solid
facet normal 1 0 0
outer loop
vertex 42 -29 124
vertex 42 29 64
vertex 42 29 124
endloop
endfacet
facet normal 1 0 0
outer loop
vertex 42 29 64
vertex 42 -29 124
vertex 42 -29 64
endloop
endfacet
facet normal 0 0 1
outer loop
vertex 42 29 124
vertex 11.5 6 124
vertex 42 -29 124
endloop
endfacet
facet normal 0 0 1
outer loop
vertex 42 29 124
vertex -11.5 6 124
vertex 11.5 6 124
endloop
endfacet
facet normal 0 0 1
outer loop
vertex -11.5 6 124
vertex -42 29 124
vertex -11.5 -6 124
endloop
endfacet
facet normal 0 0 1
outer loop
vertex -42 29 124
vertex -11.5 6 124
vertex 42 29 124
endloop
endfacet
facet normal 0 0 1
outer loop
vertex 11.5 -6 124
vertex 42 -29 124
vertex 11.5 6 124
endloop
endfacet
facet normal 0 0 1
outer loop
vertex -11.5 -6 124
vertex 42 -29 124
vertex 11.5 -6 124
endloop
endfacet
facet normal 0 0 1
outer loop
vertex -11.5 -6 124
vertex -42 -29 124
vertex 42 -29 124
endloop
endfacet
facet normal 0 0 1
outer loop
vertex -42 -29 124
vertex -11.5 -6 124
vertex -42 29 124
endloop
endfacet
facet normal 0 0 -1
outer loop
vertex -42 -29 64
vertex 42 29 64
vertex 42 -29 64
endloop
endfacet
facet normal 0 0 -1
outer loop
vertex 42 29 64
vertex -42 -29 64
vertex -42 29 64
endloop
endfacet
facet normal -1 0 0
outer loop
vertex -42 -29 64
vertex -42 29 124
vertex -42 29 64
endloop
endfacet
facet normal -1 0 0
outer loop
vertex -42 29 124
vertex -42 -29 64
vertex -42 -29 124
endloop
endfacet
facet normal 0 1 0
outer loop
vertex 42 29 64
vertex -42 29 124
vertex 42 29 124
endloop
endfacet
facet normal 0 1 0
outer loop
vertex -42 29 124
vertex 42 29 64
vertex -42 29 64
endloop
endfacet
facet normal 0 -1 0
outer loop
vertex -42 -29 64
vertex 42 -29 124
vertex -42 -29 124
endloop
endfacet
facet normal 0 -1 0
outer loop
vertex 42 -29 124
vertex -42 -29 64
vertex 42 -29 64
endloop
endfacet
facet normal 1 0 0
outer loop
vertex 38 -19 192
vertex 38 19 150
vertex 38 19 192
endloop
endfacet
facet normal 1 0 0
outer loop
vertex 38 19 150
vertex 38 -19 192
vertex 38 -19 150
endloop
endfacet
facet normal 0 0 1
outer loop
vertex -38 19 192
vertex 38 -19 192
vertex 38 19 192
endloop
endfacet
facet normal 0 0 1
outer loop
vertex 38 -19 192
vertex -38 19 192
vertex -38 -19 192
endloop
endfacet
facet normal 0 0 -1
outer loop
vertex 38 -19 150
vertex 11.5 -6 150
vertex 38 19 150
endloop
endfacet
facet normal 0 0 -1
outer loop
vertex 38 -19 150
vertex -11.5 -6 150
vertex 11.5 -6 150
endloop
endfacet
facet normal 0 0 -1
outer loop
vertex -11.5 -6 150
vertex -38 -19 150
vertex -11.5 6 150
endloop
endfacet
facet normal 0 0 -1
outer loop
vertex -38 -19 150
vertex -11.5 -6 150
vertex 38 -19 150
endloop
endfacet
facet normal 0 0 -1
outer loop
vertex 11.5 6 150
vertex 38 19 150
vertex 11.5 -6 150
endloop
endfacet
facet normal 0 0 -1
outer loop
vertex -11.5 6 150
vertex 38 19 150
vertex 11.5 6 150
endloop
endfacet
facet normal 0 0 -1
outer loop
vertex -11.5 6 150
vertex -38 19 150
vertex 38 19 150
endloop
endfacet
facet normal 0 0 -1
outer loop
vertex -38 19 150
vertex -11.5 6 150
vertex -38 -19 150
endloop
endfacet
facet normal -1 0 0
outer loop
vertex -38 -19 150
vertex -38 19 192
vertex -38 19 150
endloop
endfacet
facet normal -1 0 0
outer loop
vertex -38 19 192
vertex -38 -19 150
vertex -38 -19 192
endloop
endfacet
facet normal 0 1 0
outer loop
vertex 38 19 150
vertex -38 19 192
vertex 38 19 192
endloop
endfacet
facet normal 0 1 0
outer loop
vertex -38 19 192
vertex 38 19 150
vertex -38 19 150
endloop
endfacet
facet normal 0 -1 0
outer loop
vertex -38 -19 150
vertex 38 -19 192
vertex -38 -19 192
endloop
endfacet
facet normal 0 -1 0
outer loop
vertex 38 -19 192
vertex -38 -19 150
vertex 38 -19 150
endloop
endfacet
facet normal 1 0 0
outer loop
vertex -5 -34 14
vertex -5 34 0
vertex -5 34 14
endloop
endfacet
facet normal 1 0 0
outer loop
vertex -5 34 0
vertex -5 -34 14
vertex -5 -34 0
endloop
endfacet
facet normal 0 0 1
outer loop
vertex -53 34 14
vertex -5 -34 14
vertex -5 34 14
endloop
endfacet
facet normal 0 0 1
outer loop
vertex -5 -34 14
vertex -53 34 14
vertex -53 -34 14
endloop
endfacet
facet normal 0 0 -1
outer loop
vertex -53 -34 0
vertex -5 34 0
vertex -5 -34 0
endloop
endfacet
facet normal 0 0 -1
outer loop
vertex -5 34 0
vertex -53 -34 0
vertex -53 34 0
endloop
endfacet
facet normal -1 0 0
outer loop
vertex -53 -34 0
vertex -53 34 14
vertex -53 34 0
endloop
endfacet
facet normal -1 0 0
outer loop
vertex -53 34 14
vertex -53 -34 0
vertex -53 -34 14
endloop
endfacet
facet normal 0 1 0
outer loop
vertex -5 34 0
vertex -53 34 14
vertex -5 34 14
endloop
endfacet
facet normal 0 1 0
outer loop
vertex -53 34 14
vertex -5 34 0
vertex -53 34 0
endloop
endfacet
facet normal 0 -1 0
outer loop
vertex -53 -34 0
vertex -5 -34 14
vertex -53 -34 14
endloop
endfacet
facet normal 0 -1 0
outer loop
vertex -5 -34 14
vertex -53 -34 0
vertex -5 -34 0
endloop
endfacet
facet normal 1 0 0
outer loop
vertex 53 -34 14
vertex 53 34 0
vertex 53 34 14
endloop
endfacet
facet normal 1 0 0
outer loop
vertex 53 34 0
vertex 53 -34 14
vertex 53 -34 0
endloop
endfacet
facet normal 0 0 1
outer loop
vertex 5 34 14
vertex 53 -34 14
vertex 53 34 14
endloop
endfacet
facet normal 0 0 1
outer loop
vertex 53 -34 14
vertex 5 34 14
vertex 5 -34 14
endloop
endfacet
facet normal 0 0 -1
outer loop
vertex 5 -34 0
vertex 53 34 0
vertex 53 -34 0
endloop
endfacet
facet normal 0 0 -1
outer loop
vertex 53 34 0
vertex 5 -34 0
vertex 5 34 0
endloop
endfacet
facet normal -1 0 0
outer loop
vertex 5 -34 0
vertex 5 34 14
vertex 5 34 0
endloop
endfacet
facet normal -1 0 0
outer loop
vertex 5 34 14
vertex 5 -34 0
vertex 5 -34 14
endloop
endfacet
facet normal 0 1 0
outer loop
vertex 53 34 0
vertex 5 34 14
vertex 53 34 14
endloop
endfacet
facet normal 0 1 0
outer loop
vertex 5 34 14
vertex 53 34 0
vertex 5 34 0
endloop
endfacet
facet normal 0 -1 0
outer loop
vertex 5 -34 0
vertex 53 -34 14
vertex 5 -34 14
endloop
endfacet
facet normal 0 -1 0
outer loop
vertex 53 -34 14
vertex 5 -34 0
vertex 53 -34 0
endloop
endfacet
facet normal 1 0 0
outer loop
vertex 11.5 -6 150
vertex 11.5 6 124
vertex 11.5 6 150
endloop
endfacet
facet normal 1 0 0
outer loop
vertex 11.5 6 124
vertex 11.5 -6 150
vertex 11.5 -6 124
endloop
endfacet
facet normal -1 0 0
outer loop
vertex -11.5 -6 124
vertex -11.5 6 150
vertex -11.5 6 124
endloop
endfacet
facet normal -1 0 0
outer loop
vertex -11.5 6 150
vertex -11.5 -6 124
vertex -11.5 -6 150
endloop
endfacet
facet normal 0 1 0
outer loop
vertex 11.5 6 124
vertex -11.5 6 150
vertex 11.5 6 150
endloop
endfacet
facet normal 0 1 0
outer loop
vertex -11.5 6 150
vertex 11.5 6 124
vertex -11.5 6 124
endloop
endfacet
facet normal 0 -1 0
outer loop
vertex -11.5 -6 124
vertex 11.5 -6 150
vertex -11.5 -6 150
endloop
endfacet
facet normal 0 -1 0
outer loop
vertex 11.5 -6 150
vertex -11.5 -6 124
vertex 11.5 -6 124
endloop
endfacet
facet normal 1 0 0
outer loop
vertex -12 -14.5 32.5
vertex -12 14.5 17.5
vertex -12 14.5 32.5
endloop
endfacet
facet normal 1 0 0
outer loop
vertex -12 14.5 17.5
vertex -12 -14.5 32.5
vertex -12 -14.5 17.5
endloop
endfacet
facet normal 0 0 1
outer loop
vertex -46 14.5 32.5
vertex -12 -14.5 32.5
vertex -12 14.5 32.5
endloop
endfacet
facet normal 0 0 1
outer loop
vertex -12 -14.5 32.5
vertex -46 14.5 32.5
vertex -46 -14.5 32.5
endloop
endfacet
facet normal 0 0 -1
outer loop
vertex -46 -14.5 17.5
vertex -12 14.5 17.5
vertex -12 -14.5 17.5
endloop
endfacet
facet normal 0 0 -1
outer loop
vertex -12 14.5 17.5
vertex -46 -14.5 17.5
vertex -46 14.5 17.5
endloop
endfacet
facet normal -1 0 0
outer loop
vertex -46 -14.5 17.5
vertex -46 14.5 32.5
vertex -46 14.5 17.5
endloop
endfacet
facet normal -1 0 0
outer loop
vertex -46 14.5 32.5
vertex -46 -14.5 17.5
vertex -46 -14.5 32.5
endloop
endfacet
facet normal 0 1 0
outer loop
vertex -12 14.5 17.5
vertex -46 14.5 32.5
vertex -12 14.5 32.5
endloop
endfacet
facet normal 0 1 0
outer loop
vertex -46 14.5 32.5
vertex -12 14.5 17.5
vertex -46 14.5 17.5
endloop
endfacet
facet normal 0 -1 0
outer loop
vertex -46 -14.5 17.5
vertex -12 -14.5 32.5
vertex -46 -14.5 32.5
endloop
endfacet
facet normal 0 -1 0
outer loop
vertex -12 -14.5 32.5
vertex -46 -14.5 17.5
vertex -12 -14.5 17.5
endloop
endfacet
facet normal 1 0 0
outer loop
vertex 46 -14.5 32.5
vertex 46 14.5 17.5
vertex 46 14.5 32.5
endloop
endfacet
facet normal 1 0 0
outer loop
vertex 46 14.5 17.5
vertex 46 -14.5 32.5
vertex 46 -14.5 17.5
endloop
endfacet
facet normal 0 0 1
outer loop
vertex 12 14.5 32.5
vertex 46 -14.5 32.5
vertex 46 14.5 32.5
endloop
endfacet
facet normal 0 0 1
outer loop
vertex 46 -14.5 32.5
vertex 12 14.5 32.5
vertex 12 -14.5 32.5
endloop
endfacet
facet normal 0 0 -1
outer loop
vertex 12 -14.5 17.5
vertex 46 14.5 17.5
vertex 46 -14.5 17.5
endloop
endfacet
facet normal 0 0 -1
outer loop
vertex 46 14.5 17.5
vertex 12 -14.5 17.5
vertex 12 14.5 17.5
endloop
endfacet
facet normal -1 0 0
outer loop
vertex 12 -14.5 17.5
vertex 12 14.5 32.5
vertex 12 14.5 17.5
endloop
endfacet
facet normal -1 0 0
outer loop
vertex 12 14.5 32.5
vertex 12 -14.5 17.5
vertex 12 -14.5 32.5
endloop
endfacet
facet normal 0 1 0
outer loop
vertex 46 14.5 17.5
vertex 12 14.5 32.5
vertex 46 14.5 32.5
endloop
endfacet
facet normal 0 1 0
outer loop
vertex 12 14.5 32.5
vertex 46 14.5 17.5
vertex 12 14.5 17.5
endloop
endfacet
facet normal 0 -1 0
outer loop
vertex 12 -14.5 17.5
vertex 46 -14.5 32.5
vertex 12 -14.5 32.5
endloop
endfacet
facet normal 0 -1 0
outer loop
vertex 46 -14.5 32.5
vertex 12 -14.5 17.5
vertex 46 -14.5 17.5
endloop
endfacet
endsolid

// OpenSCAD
// Provisional envelope model. NOT printable production parts.
// All coordinates in mm: X across, Y forward, Z up.
show_shells = true;
show_parts = true;
$fn = 32;
if (show_shells) color([0.75,0.75,0.75,0.12]) translate([0, 0, 94]) cube([84, 58, 60], center=true); // body_shell
if (show_shells) color([0.75,0.75,0.75,0.12]) translate([0, 0, 171]) cube([76, 38, 42], center=true); // head_shell
if (show_shells) color([0.75,0.75,0.75,0.12]) translate([-29, 0, 7]) cube([48, 68, 14], center=true); // sole_l
if (show_shells) color([0.75,0.75,0.75,0.12]) translate([29, 0, 7]) cube([48, 68, 14], center=true); // sole_r
if (show_parts) color([0.7411764705882353, 0.48627450980392156, 0.2823529411764706]) translate([-22, 0, 81]) cube([34, 15, 30], center=true); // hip_l
if (show_parts) color([0.7411764705882353, 0.48627450980392156, 0.2823529411764706]) translate([22, 0, 81]) cube([34, 15, 30], center=true); // hip_r
if (show_parts) color([0.5098039215686274, 0.6, 0.4470588235294118]) translate([0, 0, 107]) cube([50, 30, 18], center=true); // battery
if (show_parts) color([0.3843137254901961, 0.5490196078431373, 0.6274509803921569]) translate([0, -22, 105]) cube([65, 6, 30], center=true); // pi
if (show_parts) color([0.3843137254901961, 0.5490196078431373, 0.6274509803921569]) translate([0, 22, 108]) cube([52, 7, 28], center=true); // esp32
if (show_parts) color([0.7098039215686275, 0.6039215686274509, 0.34901960784313724]) translate([0, -18, 76]) cube([50, 17, 10], center=true); // servo_bec
if (show_parts) color([0.7098039215686275, 0.6039215686274509, 0.34901960784313724]) translate([0, 18, 75]) cube([43, 17, 7], center=true); // logic_bec
if (show_parts) color([0.3843137254901961, 0.5490196078431373, 0.6274509803921569]) translate([0, 0, 120]) cube([20, 16, 4], center=true); // imu
if (show_parts) color([0.6431372549019608, 0.5607843137254902, 0.6509803921568628]) translate([35, 0, 108]) cube([3, 18, 18], center=true); // amp
if (show_parts) color([0.6431372549019608, 0.5607843137254902, 0.6509803921568628]) translate([-35, 0, 108]) cube([3, 14, 18], center=true); // mic
if (show_parts) color([0.6431372549019608, 0.5607843137254902, 0.6509803921568628]) translate([0, 24, 86]) cube([28, 5, 12], center=true); // speaker
if (show_parts) color([0.7411764705882353, 0.48627450980392156, 0.2823529411764706]) translate([0, 0, 137]) cube([23, 12, 29], center=true); // head_yaw
if (show_parts) color([0.7411764705882353, 0.48627450980392156, 0.2823529411764706]) translate([23, 0, 171]) cube([12, 23, 29], center=true); // head_pitch
if (show_parts) color([0.3843137254901961, 0.5490196078431373, 0.6274509803921569]) translate([0, 12, 171]) cube([25, 9, 24], center=true); // camera
if (show_parts) color([0.7411764705882353, 0.48627450980392156, 0.2823529411764706]) translate([-29, 0, 25]) cube([34, 29, 15], center=true); // foot_l
if (show_parts) color([0.7411764705882353, 0.48627450980392156, 0.2823529411764706]) translate([29, 0, 25]) cube([34, 29, 15], center=true); // foot_r
